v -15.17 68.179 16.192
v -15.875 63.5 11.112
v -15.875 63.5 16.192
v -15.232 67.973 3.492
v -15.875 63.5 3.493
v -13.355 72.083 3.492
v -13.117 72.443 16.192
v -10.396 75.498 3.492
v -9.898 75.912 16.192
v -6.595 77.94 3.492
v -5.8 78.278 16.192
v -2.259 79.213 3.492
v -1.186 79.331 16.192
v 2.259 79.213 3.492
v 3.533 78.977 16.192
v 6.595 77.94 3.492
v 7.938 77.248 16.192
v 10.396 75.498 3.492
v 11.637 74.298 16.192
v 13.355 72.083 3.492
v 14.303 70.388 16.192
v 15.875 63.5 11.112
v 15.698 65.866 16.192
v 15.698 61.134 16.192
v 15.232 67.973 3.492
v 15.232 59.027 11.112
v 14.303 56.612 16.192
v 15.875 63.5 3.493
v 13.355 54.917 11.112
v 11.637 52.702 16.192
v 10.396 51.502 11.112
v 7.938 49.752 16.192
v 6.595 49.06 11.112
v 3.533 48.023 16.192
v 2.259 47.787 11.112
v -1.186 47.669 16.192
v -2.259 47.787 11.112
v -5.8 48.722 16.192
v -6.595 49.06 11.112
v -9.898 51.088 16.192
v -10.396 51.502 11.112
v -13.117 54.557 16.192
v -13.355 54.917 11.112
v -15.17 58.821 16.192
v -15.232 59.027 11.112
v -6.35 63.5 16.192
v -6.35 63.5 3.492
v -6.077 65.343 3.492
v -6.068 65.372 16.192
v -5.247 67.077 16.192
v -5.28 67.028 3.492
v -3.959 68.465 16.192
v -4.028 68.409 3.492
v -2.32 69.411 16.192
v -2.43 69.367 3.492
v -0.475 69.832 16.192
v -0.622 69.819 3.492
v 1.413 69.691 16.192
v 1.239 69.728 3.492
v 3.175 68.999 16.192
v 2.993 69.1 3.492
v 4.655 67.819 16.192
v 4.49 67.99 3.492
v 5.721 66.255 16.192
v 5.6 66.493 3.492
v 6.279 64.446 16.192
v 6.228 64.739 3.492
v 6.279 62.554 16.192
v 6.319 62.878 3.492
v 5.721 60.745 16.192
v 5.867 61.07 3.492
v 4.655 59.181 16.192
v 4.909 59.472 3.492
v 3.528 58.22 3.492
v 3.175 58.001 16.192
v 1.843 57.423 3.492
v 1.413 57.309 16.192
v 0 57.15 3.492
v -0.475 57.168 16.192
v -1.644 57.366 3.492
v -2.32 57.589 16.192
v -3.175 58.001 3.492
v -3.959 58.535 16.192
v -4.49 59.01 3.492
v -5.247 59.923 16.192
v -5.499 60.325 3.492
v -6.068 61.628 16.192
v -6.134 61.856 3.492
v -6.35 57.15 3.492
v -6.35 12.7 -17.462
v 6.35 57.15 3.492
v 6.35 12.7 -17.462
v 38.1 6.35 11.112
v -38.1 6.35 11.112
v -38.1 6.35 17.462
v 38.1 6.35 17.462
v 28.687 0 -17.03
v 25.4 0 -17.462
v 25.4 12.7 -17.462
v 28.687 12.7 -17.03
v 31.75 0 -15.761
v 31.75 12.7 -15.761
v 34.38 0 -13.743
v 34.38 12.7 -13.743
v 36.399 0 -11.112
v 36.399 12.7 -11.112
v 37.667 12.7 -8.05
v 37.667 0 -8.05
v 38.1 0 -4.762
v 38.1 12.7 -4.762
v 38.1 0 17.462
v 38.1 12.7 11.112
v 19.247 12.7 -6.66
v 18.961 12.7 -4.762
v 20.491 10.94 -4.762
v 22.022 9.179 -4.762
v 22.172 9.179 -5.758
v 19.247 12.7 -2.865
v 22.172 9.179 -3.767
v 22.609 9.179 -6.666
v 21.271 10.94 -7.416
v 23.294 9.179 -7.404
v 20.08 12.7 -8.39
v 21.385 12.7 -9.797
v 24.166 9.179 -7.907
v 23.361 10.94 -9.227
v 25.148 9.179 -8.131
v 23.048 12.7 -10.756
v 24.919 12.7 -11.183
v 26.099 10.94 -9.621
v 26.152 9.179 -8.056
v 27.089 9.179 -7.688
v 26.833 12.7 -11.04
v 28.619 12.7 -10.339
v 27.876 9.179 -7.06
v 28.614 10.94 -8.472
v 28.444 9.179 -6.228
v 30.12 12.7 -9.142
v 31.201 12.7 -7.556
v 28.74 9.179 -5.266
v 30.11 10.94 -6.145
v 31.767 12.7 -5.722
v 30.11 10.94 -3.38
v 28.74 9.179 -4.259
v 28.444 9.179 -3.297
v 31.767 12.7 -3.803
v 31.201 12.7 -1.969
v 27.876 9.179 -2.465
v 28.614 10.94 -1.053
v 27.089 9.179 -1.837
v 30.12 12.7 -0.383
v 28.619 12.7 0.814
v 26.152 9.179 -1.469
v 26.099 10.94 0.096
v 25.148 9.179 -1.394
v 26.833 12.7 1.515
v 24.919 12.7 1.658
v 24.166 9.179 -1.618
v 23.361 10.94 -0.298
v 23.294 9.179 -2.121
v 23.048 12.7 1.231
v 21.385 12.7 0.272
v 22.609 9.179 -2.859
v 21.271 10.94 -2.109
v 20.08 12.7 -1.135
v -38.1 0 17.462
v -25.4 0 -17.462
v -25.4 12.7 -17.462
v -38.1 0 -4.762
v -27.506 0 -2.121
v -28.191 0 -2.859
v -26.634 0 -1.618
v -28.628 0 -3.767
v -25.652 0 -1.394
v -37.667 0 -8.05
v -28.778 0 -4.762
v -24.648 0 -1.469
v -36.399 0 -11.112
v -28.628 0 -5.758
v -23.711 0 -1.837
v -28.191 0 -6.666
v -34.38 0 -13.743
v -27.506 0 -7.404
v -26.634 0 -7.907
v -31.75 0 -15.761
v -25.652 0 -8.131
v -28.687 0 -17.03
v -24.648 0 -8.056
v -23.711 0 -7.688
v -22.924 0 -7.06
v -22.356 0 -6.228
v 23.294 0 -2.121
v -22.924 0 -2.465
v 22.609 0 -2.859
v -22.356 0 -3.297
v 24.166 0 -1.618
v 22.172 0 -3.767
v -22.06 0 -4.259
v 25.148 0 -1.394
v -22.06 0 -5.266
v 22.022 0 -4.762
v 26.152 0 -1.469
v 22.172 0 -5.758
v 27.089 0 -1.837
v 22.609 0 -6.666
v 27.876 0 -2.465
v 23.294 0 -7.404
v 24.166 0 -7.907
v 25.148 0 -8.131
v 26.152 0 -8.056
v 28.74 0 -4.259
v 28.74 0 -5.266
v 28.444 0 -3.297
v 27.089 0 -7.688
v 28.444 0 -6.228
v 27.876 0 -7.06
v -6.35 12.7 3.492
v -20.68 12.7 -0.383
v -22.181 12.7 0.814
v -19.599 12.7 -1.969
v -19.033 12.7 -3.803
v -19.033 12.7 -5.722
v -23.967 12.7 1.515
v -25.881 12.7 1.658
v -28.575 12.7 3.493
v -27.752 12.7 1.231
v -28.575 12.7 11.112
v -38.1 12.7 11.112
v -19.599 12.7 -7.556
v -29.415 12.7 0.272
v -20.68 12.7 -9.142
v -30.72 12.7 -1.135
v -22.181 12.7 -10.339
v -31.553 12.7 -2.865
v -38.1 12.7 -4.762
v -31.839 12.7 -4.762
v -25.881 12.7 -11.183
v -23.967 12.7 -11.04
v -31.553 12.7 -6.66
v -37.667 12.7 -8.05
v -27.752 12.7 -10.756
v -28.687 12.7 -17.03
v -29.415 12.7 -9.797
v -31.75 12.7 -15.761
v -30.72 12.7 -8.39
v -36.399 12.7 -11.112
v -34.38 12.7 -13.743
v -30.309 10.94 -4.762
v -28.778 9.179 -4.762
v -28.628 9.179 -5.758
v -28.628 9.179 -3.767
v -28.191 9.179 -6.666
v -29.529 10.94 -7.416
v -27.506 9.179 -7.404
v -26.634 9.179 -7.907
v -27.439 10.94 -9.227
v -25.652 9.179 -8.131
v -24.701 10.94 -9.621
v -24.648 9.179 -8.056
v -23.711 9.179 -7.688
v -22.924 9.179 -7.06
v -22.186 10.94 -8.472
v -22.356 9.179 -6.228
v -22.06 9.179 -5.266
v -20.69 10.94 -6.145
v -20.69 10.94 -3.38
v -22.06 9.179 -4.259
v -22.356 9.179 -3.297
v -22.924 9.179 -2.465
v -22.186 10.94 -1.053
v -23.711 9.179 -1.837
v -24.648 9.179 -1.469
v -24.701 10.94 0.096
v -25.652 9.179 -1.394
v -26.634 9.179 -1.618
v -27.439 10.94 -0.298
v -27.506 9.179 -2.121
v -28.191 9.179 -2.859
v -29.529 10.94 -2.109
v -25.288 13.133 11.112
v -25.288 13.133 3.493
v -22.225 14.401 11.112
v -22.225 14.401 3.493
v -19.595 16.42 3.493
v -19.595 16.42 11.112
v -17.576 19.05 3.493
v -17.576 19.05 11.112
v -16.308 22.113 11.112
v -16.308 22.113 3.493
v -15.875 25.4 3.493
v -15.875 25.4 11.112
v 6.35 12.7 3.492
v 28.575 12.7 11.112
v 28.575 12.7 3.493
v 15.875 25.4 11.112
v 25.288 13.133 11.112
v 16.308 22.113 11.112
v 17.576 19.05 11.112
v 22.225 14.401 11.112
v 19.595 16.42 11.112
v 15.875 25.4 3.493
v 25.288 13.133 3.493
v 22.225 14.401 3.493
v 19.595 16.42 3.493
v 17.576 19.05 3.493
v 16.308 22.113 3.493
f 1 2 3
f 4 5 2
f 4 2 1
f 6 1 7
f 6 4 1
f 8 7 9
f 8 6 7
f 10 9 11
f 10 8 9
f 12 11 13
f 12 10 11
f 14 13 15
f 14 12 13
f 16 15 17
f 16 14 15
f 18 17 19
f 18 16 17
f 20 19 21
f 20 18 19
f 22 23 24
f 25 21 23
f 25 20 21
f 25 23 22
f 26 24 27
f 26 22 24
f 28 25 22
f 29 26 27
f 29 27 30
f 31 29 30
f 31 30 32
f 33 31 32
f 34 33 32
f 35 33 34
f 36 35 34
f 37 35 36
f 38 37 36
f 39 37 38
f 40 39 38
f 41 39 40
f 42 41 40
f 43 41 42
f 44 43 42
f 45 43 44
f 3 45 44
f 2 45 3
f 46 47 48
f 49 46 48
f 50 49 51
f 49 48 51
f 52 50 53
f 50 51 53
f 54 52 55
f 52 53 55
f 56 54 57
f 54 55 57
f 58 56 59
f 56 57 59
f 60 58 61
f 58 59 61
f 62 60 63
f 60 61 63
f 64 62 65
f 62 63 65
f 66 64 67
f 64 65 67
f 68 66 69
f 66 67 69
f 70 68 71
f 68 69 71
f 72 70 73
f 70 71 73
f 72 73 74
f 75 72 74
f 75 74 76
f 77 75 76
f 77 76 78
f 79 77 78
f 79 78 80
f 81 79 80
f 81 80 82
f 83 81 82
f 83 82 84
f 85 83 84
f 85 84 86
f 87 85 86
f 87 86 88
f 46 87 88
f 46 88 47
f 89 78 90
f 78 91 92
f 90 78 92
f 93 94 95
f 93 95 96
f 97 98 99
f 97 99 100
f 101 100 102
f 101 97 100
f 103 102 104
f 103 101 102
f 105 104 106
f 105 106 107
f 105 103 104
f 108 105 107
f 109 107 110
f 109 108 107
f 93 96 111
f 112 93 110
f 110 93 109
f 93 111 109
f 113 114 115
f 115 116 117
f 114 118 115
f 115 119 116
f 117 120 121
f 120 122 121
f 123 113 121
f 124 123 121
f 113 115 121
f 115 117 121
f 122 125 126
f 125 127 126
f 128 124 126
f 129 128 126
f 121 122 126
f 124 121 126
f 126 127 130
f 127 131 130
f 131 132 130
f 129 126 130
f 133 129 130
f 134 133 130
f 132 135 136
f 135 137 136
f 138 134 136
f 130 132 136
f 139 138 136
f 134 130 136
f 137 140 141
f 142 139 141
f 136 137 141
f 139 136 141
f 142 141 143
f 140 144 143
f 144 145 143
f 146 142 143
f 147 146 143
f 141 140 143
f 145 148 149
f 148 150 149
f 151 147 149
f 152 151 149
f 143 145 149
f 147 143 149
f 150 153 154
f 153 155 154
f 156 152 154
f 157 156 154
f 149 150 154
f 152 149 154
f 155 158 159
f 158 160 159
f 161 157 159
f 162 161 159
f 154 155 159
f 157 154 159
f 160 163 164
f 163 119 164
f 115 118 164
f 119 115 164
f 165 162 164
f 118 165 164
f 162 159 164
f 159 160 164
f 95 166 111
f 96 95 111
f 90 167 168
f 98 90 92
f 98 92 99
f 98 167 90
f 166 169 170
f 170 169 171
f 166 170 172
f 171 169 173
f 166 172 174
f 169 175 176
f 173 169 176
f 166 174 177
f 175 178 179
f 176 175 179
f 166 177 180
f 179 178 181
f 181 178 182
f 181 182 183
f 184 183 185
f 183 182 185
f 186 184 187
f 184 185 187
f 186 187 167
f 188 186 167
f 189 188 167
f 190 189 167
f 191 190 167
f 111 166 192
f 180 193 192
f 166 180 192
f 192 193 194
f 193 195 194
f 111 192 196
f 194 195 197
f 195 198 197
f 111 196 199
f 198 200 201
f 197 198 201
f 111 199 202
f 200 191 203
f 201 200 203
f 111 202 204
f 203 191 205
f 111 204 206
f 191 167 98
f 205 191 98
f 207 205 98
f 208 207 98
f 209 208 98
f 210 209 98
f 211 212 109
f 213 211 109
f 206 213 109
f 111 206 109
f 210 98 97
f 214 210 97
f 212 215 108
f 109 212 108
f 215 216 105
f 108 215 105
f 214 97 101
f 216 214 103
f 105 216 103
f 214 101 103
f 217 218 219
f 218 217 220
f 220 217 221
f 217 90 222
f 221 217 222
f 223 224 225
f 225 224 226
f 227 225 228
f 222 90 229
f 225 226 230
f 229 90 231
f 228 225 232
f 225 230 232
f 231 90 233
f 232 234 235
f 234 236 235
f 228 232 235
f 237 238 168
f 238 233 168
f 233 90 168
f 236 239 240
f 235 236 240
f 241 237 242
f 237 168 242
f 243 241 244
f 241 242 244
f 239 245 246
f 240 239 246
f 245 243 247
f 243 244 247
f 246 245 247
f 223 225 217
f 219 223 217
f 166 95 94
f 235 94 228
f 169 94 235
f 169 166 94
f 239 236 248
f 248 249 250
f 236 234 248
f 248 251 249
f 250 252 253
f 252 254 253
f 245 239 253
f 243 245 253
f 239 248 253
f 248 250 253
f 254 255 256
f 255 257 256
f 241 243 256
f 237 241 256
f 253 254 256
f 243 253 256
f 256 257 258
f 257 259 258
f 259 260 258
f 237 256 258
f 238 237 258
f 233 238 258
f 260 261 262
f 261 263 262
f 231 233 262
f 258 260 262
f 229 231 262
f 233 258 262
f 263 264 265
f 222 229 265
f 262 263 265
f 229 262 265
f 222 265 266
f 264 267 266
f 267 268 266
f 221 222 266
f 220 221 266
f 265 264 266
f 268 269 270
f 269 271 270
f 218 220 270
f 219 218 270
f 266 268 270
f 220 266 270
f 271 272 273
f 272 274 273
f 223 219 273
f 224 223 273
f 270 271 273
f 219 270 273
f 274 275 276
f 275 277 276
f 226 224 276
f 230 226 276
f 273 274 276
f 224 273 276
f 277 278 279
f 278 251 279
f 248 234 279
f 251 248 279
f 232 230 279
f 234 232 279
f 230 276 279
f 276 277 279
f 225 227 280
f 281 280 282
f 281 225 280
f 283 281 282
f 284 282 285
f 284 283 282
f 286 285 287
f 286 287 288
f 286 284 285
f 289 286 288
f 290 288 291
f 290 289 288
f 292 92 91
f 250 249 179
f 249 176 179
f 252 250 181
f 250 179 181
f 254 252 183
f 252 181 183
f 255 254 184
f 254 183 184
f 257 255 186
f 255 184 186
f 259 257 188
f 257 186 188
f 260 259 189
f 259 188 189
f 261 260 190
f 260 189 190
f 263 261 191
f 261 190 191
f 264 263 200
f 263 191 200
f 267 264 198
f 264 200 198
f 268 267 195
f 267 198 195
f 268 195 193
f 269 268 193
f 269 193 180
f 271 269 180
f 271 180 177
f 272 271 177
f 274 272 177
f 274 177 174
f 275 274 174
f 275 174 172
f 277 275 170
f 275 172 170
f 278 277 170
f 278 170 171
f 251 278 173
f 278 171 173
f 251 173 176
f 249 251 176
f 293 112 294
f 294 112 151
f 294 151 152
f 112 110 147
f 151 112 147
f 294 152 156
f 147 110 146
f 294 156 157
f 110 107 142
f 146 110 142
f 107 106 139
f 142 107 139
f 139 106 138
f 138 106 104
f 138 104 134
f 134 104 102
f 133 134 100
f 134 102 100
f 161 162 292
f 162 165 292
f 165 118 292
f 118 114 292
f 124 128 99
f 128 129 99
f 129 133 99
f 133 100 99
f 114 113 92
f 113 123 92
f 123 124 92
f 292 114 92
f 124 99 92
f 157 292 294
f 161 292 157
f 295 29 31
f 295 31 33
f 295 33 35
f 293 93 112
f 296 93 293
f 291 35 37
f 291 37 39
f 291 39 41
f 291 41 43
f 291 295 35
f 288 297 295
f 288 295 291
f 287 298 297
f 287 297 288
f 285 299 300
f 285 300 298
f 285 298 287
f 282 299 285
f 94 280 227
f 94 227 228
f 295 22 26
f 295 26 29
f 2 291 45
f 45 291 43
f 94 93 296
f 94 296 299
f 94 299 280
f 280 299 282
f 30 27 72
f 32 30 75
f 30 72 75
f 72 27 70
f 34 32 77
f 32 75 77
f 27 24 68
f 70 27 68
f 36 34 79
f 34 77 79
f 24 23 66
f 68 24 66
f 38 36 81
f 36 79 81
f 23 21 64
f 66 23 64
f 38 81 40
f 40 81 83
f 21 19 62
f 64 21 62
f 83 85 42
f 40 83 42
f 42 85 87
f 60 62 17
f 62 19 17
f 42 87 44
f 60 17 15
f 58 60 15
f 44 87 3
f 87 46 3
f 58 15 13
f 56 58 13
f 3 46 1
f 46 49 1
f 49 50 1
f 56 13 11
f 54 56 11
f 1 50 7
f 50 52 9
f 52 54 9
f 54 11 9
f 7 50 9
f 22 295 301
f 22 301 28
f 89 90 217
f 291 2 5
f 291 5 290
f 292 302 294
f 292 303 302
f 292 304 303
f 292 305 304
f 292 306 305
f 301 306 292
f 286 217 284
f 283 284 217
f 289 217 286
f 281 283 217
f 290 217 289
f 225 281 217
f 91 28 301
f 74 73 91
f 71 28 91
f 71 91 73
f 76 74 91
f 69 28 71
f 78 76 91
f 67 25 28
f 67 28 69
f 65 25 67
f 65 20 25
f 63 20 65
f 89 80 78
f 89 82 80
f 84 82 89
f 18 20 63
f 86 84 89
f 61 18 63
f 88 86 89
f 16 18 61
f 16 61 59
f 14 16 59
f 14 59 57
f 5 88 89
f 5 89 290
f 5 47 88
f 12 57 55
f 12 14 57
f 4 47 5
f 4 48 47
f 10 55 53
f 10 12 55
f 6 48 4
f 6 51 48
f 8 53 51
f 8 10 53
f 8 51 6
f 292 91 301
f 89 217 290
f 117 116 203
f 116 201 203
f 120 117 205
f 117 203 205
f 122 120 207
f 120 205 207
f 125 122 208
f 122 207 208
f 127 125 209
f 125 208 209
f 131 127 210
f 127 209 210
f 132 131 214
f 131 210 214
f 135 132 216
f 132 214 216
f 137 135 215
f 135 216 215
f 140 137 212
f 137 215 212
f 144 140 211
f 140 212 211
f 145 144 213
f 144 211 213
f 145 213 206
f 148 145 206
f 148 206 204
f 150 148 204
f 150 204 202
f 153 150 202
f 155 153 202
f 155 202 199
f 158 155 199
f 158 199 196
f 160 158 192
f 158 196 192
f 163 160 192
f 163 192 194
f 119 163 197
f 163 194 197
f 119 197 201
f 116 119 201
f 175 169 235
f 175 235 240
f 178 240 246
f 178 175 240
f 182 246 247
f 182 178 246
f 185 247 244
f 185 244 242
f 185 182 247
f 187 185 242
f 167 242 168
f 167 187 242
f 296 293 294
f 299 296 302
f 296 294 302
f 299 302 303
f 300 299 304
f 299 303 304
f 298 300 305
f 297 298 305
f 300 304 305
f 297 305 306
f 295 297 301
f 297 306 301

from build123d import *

# Parameters (mm, degrees)
BOSS_EXTRUDE4_DEPTH                              = 12.7
SKETCH10_W                                       = 76.2
SKETCH10_H                                       = 6.35
BOSS_EXTRUDE5_DEPTH                              = 6.35
CSK_FOR_1_4_FLAT_HEAD_MACHINE_SCREW1_D           = 6.7564
CSK_FOR_1_4_FLAT_HEAD_MACHINE_SCREW1_CSINK_D     = 12.8778
CSK_FOR_1_4_FLAT_HEAD_MACHINE_SCREW1_CSINK_ANGLE = 82
BOSS_EXTRUDE6_DEPTH                              = 7.62
FILLET1_R                                        = 12.7
SKETCH20_R                                       = 15.875
SKETCH20_R_2                                     = 6.35
BOSS_EXTRUDE7_DEPTH                              = 12.7
BOSS_EXTRUDE8_DEPTH                              = 6.35


with BuildPart() as part:
    # Sketch1 → Boss-Extrude4 (new body)
    with BuildSketch(Plane(origin=(0, 0, 0), x_dir=(1, 0, 0), z_dir=(0, 1, 0))):
        with BuildLine():
            Line((-25.4, 17.4625), (25.4, 17.4625))
            ThreePointArc((25.4, 17.4625), (34.380256121, 13.742756121), (38.1, 4.7625))
            Line((38.1, 4.7625), (38.1, -11.1125))
            Line((38.1, -11.1125), (-38.1, -11.1125))
            Line((-38.1, -11.1125), (-38.1, 4.7625))
            ThreePointArc((-38.1, 4.7625), (-34.380256121, 13.742756121), (-25.4, 17.4625))
        make_face()
    extrude(amount=BOSS_EXTRUDE4_DEPTH)

    # Sketch10 → Boss-Extrude5 (add)
    with BuildSketch(Plane(origin=(0, 0, 0), x_dir=(1, 0, 0), z_dir=(0, 1, 0))):
        with Locations((0, -14.2875)):
            Rectangle(SKETCH10_W, SKETCH10_H)
    extrude(amount=BOSS_EXTRUDE5_DEPTH)

    # CSK for 1/4 Flat Head Machine Screw1 (through all)
    with Locations(Plane(origin=(0, 12.7, 0), x_dir=(1, 0, 0), z_dir=(0, 1, 0))):
        with Locations((-25.4, 4.7625), (25.4, 4.7625)):
            CounterSinkHole(CSK_FOR_1_4_FLAT_HEAD_MACHINE_SCREW1_D / 2, CSK_FOR_1_4_FLAT_HEAD_MACHINE_SCREW1_CSINK_D / 2, counter_sink_angle=CSK_FOR_1_4_FLAT_HEAD_MACHINE_SCREW1_CSINK_ANGLE)

    # Sketch19 → Boss-Extrude6 (add)
    with BuildSketch(Plane.XY.offset(11.1125)):
        with BuildLine():
            Line((-15.875, 12.7), (15.875, 12.7))
            Line((15.875, 12.7), (15.875, 63.5))
            ThreePointArc((15.875, 63.5), (0, 47.625), (-15.875, 63.5))
            Line((-15.875, 63.5), (-15.875, 12.7))
        make_face()
    extrude(amount=-BOSS_EXTRUDE6_DEPTH)

    # Fillet1
    fillet1_edges = [part.edges().sort_by_distance(p)[0] for p in [
        (-15.875, 12.7, 7.3025),
        (15.875, 12.7, 7.3025),
    ]]
    fillet(fillet1_edges, radius=FILLET1_R)

    # Sketch20 → Boss-Extrude7 (add)
    with BuildSketch(Plane(origin=(0, 0, 3.4925), x_dir=(-1, 0, 0), z_dir=(0, 0, -1))):
        with Locations((0, 63.5)):
            Circle(SKETCH20_R)
        with Locations((0, 63.5)):
            Circle(SKETCH20_R_2, mode=Mode.SUBTRACT)
    extrude(amount=-BOSS_EXTRUDE7_DEPTH)

    # Sketch21 → Boss-Extrude8 (add, symmetric)
    with BuildSketch(Plane(origin=(0, 0, 0), x_dir=(0, 0, -1), z_dir=(1, 0, 0))):
        Polygon((-3.4925, 57.15), (17.4625, 12.7), (-3.4925, 12.7), align=None)
    extrude(amount=BOSS_EXTRUDE8_DEPTH, both=True)


solid = part.part
